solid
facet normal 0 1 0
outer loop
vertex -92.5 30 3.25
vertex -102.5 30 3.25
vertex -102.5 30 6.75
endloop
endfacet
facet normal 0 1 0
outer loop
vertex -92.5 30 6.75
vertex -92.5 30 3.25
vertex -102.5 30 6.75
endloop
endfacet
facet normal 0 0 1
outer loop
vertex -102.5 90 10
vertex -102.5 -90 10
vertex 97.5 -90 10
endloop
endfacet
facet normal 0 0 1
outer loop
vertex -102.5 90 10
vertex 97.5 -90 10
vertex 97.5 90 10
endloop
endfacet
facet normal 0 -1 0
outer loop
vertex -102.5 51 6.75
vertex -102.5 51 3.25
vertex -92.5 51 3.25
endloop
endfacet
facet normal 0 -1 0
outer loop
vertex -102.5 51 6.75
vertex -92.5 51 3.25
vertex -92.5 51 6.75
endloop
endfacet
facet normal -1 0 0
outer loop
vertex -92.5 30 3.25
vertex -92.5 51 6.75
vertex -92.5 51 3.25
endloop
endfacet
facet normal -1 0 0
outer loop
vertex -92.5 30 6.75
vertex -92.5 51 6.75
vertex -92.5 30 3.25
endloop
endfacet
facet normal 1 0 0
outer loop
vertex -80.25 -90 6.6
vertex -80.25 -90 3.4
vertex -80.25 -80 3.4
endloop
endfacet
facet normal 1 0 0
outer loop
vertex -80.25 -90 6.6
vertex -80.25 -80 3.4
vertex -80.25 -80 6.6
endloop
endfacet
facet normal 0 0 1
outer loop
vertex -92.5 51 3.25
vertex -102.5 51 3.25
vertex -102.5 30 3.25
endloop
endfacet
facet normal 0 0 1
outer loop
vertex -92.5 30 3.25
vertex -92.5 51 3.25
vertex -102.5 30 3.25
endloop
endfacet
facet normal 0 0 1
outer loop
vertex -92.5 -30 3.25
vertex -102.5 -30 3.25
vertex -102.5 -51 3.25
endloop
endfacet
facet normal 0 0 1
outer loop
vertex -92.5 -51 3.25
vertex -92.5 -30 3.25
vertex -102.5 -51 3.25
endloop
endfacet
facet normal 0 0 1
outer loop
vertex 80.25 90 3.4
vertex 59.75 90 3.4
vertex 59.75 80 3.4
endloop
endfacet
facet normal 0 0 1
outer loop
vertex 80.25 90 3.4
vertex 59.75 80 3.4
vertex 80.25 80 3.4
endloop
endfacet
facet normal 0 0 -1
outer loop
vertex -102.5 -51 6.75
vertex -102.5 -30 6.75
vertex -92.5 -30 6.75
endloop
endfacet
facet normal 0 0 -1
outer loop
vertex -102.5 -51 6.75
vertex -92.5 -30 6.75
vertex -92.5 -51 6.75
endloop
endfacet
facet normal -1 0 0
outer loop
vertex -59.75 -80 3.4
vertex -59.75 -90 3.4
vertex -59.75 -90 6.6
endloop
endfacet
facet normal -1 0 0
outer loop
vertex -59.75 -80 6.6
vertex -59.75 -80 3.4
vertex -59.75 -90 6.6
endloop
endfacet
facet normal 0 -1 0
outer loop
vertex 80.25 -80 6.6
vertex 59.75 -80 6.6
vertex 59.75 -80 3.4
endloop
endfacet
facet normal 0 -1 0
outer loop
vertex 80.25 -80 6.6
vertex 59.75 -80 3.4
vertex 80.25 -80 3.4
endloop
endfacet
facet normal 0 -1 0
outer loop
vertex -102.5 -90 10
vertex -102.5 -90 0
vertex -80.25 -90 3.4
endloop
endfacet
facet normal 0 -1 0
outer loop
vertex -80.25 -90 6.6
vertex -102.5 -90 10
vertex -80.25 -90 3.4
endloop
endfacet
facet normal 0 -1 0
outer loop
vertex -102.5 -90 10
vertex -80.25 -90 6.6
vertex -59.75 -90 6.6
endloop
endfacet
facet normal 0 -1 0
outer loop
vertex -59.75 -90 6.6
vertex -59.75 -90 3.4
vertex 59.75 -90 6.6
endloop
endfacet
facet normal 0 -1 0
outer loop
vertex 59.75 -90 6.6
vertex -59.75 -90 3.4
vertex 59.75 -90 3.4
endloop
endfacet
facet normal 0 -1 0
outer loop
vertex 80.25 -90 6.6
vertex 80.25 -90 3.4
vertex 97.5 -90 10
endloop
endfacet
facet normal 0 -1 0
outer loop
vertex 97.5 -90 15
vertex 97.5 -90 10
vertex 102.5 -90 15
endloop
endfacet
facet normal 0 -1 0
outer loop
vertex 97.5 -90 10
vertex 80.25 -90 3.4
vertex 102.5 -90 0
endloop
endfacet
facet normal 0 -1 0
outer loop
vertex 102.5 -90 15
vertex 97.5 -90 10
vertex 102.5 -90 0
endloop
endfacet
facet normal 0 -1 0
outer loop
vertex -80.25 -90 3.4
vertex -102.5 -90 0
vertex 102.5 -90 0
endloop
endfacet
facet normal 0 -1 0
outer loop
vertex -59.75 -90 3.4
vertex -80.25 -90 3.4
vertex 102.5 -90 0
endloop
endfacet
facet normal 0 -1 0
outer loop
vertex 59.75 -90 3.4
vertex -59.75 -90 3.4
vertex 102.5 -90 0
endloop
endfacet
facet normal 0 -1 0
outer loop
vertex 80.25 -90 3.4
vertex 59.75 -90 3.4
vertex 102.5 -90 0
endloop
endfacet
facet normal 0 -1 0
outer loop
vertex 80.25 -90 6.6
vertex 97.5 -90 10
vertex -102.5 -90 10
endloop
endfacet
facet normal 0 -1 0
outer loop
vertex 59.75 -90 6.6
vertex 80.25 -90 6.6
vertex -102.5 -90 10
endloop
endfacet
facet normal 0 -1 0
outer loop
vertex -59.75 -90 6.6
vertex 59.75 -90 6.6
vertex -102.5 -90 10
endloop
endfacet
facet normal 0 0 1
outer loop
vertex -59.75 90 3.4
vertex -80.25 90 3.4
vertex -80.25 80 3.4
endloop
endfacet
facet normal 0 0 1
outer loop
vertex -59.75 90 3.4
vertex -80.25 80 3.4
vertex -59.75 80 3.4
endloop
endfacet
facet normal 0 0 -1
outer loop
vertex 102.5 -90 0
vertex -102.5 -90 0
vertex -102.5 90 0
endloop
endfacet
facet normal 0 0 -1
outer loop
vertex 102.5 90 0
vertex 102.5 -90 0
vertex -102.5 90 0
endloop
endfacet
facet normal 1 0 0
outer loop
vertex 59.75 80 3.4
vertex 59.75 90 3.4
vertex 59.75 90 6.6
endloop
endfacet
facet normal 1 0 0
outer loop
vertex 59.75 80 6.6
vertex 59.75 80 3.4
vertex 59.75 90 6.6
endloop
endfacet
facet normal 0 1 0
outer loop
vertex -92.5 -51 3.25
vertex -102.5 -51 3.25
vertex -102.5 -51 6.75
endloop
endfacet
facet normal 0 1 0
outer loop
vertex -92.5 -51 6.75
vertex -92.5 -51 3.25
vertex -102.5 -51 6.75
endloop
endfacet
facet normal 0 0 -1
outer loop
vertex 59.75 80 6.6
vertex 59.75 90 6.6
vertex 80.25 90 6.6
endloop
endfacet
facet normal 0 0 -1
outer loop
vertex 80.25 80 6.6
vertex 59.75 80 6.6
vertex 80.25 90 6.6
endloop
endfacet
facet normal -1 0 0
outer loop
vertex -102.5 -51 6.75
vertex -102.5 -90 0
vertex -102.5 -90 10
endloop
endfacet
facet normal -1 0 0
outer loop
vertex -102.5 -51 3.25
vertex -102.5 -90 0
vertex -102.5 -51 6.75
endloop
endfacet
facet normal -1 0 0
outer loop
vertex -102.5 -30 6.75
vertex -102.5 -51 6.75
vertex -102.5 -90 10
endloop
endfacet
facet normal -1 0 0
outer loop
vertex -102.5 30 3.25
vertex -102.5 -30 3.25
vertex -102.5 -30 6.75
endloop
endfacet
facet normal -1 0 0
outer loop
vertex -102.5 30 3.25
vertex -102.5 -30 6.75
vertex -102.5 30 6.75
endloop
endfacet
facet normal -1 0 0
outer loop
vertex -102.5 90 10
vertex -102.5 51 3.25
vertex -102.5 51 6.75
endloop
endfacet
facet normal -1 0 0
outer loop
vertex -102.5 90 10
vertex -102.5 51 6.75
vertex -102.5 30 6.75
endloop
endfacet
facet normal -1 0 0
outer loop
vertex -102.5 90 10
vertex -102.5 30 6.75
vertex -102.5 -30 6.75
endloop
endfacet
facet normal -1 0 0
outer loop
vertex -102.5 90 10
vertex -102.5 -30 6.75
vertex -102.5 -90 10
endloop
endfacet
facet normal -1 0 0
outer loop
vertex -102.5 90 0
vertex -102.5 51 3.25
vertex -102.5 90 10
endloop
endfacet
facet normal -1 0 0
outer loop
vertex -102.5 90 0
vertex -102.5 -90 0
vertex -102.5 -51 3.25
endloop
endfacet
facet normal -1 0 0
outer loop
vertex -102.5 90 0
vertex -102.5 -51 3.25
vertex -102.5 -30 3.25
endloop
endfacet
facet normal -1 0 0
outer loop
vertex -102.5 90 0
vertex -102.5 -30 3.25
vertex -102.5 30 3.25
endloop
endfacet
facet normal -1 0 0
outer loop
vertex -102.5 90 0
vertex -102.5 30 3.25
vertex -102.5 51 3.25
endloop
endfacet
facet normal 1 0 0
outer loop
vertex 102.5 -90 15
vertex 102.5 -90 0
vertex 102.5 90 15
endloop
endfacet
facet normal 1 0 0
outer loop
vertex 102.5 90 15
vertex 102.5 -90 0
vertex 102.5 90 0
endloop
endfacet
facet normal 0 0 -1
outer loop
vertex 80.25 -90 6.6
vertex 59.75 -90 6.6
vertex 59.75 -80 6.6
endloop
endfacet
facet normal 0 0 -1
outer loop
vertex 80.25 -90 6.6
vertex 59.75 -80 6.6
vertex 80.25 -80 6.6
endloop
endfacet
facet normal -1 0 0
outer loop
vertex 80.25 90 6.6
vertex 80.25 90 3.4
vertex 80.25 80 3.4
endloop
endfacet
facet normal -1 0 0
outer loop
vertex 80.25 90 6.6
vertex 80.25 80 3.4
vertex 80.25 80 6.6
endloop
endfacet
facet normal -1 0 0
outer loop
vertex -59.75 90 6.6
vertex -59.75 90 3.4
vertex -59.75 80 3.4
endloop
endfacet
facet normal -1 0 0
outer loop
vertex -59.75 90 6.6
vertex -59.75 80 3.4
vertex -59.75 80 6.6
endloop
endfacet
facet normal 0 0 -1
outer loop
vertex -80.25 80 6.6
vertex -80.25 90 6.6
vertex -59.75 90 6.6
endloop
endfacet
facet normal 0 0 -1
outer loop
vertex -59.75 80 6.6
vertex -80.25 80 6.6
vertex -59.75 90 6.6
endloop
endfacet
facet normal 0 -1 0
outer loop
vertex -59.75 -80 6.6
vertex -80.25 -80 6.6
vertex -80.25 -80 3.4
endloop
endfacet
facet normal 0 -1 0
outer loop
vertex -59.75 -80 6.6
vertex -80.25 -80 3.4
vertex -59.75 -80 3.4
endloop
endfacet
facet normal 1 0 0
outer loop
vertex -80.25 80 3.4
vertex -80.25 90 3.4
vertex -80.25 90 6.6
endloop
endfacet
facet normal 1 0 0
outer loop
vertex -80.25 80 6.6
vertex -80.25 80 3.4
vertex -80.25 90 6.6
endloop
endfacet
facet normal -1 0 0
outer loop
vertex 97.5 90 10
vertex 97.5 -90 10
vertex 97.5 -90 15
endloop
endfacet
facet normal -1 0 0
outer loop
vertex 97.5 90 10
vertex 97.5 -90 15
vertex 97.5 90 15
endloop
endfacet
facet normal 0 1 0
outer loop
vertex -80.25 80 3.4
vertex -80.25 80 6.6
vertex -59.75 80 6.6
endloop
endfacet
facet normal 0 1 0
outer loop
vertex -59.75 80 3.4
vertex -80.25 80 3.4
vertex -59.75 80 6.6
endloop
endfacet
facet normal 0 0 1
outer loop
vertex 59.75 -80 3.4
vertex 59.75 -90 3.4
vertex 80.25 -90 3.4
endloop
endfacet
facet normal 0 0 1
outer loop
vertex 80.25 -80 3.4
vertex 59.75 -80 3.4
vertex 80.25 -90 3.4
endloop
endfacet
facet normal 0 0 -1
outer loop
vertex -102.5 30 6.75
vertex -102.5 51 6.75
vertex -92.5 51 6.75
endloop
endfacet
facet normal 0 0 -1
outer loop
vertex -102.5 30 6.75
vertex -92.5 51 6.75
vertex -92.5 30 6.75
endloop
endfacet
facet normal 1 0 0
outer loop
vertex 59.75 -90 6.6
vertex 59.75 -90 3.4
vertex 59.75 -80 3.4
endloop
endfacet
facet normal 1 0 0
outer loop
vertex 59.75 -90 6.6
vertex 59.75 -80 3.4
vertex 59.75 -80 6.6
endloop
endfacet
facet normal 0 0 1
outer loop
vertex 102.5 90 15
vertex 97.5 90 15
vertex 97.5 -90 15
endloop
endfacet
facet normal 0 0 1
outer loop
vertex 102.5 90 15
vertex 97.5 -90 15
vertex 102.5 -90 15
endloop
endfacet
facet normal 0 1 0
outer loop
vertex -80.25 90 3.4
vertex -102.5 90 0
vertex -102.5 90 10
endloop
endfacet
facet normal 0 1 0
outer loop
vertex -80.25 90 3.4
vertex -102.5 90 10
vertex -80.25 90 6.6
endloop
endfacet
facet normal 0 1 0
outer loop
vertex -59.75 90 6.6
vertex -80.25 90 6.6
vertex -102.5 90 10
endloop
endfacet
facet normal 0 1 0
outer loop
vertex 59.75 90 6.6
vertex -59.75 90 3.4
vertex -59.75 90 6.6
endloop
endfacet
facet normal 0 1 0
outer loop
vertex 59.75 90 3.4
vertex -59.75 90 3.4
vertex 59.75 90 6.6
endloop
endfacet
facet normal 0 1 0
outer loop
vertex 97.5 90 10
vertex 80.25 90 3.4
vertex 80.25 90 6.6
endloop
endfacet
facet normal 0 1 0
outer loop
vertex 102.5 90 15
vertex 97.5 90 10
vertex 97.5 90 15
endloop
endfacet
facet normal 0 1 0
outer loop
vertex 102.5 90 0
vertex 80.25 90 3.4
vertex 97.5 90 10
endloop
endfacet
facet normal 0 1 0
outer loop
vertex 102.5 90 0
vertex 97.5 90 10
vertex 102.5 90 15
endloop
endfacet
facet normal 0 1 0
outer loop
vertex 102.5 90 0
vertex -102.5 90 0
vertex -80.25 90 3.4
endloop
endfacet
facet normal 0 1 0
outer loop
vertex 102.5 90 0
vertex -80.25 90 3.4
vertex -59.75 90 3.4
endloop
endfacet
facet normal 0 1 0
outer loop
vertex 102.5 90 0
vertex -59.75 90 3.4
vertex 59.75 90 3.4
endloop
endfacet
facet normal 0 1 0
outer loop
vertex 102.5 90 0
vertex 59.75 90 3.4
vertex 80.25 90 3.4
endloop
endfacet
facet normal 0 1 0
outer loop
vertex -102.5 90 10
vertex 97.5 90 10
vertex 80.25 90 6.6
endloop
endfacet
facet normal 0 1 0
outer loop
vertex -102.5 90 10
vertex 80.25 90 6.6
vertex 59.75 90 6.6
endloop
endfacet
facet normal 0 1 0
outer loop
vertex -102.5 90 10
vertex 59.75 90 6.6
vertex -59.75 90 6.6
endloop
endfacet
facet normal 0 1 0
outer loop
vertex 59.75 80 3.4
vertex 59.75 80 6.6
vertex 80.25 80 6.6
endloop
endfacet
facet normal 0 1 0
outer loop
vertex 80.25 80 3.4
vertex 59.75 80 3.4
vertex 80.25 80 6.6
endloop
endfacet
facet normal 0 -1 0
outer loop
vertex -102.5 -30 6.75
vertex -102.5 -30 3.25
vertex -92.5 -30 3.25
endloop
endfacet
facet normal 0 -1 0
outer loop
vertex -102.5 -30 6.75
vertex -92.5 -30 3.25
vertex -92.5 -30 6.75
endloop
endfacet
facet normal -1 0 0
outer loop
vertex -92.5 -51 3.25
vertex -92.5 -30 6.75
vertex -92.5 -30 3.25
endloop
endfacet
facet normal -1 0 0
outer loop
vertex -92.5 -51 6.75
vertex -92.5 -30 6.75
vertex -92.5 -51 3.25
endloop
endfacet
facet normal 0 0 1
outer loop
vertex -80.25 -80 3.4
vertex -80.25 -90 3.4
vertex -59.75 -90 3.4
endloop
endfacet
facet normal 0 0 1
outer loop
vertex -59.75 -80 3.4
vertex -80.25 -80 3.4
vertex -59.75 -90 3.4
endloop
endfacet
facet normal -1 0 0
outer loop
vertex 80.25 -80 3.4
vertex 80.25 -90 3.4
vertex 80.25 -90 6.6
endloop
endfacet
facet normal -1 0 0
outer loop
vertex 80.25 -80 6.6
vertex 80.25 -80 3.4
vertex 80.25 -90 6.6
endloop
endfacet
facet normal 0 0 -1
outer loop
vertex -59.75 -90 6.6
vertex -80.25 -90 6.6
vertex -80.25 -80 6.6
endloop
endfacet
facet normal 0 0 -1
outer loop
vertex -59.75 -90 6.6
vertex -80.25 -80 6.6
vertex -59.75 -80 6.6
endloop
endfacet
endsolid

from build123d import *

# Parameters (mm, degrees)
SKETCH1_W           = 180
SKETCH1_H           = 205
BOSS_EXTRUDE1_DEPTH = 10
SKETCH2_W           = 5
SKETCH2_H           = 180
BOSS_EXTRUDE2_DEPTH = 5
SKETCH5_W           = 21
SKETCH5_H           = 3.5
CUT_EXTRUDE3_DEPTH  = 10
SKETCH6_W           = 20.5
SKETCH6_H           = 3.2
CUT_EXTRUDE4_DEPTH  = 10


with BuildPart() as part:
    # Sketch1 → Boss-Extrude1 (new body)
    with BuildSketch(Plane(origin=(0, 0, 0), x_dir=(0, 1, 0), z_dir=(0, 0, 1))):
        Rectangle(SKETCH1_W, SKETCH1_H)
    extrude(amount=BOSS_EXTRUDE1_DEPTH)

    # Sketch2 → Boss-Extrude2 (add)
    with BuildSketch(Plane.XY.offset(10)):
        with Locations((100, 0)):
            Rectangle(SKETCH2_W, SKETCH2_H)
    extrude(amount=BOSS_EXTRUDE2_DEPTH)

    # Sketch5 → Cut-Extrude3 (cut)
    with BuildSketch(Plane(origin=(-102.5, 0, 0), x_dir=(0, -1, 0), z_dir=(-1, 0, 0))):
        with Locations((-40.5, 5)):
            Rectangle(SKETCH5_W, SKETCH5_H)
        with Locations((40.5, 5)):
            Rectangle(SKETCH5_W, SKETCH5_H)
    extrude(amount=-CUT_EXTRUDE3_DEPTH, mode=Mode.SUBTRACT)

    # Sketch6 → Cut-Extrude4 (cut)
    with BuildSketch(Plane.XZ.offset(90)):
        with Locations((70, 5)):
            Rectangle(SKETCH6_W, SKETCH6_H)
        with Locations((-70, 5)):
            Rectangle(SKETCH6_W, SKETCH6_H)
    cut_extrude4 = extrude(amount=-CUT_EXTRUDE4_DEPTH, mode=Mode.SUBTRACT)

    # Mirror1: Cut-Extrude4 across plane
    add(cut_extrude4.mirror(Plane.ZX), mode=Mode.SUBTRACT)


solid = part.part
